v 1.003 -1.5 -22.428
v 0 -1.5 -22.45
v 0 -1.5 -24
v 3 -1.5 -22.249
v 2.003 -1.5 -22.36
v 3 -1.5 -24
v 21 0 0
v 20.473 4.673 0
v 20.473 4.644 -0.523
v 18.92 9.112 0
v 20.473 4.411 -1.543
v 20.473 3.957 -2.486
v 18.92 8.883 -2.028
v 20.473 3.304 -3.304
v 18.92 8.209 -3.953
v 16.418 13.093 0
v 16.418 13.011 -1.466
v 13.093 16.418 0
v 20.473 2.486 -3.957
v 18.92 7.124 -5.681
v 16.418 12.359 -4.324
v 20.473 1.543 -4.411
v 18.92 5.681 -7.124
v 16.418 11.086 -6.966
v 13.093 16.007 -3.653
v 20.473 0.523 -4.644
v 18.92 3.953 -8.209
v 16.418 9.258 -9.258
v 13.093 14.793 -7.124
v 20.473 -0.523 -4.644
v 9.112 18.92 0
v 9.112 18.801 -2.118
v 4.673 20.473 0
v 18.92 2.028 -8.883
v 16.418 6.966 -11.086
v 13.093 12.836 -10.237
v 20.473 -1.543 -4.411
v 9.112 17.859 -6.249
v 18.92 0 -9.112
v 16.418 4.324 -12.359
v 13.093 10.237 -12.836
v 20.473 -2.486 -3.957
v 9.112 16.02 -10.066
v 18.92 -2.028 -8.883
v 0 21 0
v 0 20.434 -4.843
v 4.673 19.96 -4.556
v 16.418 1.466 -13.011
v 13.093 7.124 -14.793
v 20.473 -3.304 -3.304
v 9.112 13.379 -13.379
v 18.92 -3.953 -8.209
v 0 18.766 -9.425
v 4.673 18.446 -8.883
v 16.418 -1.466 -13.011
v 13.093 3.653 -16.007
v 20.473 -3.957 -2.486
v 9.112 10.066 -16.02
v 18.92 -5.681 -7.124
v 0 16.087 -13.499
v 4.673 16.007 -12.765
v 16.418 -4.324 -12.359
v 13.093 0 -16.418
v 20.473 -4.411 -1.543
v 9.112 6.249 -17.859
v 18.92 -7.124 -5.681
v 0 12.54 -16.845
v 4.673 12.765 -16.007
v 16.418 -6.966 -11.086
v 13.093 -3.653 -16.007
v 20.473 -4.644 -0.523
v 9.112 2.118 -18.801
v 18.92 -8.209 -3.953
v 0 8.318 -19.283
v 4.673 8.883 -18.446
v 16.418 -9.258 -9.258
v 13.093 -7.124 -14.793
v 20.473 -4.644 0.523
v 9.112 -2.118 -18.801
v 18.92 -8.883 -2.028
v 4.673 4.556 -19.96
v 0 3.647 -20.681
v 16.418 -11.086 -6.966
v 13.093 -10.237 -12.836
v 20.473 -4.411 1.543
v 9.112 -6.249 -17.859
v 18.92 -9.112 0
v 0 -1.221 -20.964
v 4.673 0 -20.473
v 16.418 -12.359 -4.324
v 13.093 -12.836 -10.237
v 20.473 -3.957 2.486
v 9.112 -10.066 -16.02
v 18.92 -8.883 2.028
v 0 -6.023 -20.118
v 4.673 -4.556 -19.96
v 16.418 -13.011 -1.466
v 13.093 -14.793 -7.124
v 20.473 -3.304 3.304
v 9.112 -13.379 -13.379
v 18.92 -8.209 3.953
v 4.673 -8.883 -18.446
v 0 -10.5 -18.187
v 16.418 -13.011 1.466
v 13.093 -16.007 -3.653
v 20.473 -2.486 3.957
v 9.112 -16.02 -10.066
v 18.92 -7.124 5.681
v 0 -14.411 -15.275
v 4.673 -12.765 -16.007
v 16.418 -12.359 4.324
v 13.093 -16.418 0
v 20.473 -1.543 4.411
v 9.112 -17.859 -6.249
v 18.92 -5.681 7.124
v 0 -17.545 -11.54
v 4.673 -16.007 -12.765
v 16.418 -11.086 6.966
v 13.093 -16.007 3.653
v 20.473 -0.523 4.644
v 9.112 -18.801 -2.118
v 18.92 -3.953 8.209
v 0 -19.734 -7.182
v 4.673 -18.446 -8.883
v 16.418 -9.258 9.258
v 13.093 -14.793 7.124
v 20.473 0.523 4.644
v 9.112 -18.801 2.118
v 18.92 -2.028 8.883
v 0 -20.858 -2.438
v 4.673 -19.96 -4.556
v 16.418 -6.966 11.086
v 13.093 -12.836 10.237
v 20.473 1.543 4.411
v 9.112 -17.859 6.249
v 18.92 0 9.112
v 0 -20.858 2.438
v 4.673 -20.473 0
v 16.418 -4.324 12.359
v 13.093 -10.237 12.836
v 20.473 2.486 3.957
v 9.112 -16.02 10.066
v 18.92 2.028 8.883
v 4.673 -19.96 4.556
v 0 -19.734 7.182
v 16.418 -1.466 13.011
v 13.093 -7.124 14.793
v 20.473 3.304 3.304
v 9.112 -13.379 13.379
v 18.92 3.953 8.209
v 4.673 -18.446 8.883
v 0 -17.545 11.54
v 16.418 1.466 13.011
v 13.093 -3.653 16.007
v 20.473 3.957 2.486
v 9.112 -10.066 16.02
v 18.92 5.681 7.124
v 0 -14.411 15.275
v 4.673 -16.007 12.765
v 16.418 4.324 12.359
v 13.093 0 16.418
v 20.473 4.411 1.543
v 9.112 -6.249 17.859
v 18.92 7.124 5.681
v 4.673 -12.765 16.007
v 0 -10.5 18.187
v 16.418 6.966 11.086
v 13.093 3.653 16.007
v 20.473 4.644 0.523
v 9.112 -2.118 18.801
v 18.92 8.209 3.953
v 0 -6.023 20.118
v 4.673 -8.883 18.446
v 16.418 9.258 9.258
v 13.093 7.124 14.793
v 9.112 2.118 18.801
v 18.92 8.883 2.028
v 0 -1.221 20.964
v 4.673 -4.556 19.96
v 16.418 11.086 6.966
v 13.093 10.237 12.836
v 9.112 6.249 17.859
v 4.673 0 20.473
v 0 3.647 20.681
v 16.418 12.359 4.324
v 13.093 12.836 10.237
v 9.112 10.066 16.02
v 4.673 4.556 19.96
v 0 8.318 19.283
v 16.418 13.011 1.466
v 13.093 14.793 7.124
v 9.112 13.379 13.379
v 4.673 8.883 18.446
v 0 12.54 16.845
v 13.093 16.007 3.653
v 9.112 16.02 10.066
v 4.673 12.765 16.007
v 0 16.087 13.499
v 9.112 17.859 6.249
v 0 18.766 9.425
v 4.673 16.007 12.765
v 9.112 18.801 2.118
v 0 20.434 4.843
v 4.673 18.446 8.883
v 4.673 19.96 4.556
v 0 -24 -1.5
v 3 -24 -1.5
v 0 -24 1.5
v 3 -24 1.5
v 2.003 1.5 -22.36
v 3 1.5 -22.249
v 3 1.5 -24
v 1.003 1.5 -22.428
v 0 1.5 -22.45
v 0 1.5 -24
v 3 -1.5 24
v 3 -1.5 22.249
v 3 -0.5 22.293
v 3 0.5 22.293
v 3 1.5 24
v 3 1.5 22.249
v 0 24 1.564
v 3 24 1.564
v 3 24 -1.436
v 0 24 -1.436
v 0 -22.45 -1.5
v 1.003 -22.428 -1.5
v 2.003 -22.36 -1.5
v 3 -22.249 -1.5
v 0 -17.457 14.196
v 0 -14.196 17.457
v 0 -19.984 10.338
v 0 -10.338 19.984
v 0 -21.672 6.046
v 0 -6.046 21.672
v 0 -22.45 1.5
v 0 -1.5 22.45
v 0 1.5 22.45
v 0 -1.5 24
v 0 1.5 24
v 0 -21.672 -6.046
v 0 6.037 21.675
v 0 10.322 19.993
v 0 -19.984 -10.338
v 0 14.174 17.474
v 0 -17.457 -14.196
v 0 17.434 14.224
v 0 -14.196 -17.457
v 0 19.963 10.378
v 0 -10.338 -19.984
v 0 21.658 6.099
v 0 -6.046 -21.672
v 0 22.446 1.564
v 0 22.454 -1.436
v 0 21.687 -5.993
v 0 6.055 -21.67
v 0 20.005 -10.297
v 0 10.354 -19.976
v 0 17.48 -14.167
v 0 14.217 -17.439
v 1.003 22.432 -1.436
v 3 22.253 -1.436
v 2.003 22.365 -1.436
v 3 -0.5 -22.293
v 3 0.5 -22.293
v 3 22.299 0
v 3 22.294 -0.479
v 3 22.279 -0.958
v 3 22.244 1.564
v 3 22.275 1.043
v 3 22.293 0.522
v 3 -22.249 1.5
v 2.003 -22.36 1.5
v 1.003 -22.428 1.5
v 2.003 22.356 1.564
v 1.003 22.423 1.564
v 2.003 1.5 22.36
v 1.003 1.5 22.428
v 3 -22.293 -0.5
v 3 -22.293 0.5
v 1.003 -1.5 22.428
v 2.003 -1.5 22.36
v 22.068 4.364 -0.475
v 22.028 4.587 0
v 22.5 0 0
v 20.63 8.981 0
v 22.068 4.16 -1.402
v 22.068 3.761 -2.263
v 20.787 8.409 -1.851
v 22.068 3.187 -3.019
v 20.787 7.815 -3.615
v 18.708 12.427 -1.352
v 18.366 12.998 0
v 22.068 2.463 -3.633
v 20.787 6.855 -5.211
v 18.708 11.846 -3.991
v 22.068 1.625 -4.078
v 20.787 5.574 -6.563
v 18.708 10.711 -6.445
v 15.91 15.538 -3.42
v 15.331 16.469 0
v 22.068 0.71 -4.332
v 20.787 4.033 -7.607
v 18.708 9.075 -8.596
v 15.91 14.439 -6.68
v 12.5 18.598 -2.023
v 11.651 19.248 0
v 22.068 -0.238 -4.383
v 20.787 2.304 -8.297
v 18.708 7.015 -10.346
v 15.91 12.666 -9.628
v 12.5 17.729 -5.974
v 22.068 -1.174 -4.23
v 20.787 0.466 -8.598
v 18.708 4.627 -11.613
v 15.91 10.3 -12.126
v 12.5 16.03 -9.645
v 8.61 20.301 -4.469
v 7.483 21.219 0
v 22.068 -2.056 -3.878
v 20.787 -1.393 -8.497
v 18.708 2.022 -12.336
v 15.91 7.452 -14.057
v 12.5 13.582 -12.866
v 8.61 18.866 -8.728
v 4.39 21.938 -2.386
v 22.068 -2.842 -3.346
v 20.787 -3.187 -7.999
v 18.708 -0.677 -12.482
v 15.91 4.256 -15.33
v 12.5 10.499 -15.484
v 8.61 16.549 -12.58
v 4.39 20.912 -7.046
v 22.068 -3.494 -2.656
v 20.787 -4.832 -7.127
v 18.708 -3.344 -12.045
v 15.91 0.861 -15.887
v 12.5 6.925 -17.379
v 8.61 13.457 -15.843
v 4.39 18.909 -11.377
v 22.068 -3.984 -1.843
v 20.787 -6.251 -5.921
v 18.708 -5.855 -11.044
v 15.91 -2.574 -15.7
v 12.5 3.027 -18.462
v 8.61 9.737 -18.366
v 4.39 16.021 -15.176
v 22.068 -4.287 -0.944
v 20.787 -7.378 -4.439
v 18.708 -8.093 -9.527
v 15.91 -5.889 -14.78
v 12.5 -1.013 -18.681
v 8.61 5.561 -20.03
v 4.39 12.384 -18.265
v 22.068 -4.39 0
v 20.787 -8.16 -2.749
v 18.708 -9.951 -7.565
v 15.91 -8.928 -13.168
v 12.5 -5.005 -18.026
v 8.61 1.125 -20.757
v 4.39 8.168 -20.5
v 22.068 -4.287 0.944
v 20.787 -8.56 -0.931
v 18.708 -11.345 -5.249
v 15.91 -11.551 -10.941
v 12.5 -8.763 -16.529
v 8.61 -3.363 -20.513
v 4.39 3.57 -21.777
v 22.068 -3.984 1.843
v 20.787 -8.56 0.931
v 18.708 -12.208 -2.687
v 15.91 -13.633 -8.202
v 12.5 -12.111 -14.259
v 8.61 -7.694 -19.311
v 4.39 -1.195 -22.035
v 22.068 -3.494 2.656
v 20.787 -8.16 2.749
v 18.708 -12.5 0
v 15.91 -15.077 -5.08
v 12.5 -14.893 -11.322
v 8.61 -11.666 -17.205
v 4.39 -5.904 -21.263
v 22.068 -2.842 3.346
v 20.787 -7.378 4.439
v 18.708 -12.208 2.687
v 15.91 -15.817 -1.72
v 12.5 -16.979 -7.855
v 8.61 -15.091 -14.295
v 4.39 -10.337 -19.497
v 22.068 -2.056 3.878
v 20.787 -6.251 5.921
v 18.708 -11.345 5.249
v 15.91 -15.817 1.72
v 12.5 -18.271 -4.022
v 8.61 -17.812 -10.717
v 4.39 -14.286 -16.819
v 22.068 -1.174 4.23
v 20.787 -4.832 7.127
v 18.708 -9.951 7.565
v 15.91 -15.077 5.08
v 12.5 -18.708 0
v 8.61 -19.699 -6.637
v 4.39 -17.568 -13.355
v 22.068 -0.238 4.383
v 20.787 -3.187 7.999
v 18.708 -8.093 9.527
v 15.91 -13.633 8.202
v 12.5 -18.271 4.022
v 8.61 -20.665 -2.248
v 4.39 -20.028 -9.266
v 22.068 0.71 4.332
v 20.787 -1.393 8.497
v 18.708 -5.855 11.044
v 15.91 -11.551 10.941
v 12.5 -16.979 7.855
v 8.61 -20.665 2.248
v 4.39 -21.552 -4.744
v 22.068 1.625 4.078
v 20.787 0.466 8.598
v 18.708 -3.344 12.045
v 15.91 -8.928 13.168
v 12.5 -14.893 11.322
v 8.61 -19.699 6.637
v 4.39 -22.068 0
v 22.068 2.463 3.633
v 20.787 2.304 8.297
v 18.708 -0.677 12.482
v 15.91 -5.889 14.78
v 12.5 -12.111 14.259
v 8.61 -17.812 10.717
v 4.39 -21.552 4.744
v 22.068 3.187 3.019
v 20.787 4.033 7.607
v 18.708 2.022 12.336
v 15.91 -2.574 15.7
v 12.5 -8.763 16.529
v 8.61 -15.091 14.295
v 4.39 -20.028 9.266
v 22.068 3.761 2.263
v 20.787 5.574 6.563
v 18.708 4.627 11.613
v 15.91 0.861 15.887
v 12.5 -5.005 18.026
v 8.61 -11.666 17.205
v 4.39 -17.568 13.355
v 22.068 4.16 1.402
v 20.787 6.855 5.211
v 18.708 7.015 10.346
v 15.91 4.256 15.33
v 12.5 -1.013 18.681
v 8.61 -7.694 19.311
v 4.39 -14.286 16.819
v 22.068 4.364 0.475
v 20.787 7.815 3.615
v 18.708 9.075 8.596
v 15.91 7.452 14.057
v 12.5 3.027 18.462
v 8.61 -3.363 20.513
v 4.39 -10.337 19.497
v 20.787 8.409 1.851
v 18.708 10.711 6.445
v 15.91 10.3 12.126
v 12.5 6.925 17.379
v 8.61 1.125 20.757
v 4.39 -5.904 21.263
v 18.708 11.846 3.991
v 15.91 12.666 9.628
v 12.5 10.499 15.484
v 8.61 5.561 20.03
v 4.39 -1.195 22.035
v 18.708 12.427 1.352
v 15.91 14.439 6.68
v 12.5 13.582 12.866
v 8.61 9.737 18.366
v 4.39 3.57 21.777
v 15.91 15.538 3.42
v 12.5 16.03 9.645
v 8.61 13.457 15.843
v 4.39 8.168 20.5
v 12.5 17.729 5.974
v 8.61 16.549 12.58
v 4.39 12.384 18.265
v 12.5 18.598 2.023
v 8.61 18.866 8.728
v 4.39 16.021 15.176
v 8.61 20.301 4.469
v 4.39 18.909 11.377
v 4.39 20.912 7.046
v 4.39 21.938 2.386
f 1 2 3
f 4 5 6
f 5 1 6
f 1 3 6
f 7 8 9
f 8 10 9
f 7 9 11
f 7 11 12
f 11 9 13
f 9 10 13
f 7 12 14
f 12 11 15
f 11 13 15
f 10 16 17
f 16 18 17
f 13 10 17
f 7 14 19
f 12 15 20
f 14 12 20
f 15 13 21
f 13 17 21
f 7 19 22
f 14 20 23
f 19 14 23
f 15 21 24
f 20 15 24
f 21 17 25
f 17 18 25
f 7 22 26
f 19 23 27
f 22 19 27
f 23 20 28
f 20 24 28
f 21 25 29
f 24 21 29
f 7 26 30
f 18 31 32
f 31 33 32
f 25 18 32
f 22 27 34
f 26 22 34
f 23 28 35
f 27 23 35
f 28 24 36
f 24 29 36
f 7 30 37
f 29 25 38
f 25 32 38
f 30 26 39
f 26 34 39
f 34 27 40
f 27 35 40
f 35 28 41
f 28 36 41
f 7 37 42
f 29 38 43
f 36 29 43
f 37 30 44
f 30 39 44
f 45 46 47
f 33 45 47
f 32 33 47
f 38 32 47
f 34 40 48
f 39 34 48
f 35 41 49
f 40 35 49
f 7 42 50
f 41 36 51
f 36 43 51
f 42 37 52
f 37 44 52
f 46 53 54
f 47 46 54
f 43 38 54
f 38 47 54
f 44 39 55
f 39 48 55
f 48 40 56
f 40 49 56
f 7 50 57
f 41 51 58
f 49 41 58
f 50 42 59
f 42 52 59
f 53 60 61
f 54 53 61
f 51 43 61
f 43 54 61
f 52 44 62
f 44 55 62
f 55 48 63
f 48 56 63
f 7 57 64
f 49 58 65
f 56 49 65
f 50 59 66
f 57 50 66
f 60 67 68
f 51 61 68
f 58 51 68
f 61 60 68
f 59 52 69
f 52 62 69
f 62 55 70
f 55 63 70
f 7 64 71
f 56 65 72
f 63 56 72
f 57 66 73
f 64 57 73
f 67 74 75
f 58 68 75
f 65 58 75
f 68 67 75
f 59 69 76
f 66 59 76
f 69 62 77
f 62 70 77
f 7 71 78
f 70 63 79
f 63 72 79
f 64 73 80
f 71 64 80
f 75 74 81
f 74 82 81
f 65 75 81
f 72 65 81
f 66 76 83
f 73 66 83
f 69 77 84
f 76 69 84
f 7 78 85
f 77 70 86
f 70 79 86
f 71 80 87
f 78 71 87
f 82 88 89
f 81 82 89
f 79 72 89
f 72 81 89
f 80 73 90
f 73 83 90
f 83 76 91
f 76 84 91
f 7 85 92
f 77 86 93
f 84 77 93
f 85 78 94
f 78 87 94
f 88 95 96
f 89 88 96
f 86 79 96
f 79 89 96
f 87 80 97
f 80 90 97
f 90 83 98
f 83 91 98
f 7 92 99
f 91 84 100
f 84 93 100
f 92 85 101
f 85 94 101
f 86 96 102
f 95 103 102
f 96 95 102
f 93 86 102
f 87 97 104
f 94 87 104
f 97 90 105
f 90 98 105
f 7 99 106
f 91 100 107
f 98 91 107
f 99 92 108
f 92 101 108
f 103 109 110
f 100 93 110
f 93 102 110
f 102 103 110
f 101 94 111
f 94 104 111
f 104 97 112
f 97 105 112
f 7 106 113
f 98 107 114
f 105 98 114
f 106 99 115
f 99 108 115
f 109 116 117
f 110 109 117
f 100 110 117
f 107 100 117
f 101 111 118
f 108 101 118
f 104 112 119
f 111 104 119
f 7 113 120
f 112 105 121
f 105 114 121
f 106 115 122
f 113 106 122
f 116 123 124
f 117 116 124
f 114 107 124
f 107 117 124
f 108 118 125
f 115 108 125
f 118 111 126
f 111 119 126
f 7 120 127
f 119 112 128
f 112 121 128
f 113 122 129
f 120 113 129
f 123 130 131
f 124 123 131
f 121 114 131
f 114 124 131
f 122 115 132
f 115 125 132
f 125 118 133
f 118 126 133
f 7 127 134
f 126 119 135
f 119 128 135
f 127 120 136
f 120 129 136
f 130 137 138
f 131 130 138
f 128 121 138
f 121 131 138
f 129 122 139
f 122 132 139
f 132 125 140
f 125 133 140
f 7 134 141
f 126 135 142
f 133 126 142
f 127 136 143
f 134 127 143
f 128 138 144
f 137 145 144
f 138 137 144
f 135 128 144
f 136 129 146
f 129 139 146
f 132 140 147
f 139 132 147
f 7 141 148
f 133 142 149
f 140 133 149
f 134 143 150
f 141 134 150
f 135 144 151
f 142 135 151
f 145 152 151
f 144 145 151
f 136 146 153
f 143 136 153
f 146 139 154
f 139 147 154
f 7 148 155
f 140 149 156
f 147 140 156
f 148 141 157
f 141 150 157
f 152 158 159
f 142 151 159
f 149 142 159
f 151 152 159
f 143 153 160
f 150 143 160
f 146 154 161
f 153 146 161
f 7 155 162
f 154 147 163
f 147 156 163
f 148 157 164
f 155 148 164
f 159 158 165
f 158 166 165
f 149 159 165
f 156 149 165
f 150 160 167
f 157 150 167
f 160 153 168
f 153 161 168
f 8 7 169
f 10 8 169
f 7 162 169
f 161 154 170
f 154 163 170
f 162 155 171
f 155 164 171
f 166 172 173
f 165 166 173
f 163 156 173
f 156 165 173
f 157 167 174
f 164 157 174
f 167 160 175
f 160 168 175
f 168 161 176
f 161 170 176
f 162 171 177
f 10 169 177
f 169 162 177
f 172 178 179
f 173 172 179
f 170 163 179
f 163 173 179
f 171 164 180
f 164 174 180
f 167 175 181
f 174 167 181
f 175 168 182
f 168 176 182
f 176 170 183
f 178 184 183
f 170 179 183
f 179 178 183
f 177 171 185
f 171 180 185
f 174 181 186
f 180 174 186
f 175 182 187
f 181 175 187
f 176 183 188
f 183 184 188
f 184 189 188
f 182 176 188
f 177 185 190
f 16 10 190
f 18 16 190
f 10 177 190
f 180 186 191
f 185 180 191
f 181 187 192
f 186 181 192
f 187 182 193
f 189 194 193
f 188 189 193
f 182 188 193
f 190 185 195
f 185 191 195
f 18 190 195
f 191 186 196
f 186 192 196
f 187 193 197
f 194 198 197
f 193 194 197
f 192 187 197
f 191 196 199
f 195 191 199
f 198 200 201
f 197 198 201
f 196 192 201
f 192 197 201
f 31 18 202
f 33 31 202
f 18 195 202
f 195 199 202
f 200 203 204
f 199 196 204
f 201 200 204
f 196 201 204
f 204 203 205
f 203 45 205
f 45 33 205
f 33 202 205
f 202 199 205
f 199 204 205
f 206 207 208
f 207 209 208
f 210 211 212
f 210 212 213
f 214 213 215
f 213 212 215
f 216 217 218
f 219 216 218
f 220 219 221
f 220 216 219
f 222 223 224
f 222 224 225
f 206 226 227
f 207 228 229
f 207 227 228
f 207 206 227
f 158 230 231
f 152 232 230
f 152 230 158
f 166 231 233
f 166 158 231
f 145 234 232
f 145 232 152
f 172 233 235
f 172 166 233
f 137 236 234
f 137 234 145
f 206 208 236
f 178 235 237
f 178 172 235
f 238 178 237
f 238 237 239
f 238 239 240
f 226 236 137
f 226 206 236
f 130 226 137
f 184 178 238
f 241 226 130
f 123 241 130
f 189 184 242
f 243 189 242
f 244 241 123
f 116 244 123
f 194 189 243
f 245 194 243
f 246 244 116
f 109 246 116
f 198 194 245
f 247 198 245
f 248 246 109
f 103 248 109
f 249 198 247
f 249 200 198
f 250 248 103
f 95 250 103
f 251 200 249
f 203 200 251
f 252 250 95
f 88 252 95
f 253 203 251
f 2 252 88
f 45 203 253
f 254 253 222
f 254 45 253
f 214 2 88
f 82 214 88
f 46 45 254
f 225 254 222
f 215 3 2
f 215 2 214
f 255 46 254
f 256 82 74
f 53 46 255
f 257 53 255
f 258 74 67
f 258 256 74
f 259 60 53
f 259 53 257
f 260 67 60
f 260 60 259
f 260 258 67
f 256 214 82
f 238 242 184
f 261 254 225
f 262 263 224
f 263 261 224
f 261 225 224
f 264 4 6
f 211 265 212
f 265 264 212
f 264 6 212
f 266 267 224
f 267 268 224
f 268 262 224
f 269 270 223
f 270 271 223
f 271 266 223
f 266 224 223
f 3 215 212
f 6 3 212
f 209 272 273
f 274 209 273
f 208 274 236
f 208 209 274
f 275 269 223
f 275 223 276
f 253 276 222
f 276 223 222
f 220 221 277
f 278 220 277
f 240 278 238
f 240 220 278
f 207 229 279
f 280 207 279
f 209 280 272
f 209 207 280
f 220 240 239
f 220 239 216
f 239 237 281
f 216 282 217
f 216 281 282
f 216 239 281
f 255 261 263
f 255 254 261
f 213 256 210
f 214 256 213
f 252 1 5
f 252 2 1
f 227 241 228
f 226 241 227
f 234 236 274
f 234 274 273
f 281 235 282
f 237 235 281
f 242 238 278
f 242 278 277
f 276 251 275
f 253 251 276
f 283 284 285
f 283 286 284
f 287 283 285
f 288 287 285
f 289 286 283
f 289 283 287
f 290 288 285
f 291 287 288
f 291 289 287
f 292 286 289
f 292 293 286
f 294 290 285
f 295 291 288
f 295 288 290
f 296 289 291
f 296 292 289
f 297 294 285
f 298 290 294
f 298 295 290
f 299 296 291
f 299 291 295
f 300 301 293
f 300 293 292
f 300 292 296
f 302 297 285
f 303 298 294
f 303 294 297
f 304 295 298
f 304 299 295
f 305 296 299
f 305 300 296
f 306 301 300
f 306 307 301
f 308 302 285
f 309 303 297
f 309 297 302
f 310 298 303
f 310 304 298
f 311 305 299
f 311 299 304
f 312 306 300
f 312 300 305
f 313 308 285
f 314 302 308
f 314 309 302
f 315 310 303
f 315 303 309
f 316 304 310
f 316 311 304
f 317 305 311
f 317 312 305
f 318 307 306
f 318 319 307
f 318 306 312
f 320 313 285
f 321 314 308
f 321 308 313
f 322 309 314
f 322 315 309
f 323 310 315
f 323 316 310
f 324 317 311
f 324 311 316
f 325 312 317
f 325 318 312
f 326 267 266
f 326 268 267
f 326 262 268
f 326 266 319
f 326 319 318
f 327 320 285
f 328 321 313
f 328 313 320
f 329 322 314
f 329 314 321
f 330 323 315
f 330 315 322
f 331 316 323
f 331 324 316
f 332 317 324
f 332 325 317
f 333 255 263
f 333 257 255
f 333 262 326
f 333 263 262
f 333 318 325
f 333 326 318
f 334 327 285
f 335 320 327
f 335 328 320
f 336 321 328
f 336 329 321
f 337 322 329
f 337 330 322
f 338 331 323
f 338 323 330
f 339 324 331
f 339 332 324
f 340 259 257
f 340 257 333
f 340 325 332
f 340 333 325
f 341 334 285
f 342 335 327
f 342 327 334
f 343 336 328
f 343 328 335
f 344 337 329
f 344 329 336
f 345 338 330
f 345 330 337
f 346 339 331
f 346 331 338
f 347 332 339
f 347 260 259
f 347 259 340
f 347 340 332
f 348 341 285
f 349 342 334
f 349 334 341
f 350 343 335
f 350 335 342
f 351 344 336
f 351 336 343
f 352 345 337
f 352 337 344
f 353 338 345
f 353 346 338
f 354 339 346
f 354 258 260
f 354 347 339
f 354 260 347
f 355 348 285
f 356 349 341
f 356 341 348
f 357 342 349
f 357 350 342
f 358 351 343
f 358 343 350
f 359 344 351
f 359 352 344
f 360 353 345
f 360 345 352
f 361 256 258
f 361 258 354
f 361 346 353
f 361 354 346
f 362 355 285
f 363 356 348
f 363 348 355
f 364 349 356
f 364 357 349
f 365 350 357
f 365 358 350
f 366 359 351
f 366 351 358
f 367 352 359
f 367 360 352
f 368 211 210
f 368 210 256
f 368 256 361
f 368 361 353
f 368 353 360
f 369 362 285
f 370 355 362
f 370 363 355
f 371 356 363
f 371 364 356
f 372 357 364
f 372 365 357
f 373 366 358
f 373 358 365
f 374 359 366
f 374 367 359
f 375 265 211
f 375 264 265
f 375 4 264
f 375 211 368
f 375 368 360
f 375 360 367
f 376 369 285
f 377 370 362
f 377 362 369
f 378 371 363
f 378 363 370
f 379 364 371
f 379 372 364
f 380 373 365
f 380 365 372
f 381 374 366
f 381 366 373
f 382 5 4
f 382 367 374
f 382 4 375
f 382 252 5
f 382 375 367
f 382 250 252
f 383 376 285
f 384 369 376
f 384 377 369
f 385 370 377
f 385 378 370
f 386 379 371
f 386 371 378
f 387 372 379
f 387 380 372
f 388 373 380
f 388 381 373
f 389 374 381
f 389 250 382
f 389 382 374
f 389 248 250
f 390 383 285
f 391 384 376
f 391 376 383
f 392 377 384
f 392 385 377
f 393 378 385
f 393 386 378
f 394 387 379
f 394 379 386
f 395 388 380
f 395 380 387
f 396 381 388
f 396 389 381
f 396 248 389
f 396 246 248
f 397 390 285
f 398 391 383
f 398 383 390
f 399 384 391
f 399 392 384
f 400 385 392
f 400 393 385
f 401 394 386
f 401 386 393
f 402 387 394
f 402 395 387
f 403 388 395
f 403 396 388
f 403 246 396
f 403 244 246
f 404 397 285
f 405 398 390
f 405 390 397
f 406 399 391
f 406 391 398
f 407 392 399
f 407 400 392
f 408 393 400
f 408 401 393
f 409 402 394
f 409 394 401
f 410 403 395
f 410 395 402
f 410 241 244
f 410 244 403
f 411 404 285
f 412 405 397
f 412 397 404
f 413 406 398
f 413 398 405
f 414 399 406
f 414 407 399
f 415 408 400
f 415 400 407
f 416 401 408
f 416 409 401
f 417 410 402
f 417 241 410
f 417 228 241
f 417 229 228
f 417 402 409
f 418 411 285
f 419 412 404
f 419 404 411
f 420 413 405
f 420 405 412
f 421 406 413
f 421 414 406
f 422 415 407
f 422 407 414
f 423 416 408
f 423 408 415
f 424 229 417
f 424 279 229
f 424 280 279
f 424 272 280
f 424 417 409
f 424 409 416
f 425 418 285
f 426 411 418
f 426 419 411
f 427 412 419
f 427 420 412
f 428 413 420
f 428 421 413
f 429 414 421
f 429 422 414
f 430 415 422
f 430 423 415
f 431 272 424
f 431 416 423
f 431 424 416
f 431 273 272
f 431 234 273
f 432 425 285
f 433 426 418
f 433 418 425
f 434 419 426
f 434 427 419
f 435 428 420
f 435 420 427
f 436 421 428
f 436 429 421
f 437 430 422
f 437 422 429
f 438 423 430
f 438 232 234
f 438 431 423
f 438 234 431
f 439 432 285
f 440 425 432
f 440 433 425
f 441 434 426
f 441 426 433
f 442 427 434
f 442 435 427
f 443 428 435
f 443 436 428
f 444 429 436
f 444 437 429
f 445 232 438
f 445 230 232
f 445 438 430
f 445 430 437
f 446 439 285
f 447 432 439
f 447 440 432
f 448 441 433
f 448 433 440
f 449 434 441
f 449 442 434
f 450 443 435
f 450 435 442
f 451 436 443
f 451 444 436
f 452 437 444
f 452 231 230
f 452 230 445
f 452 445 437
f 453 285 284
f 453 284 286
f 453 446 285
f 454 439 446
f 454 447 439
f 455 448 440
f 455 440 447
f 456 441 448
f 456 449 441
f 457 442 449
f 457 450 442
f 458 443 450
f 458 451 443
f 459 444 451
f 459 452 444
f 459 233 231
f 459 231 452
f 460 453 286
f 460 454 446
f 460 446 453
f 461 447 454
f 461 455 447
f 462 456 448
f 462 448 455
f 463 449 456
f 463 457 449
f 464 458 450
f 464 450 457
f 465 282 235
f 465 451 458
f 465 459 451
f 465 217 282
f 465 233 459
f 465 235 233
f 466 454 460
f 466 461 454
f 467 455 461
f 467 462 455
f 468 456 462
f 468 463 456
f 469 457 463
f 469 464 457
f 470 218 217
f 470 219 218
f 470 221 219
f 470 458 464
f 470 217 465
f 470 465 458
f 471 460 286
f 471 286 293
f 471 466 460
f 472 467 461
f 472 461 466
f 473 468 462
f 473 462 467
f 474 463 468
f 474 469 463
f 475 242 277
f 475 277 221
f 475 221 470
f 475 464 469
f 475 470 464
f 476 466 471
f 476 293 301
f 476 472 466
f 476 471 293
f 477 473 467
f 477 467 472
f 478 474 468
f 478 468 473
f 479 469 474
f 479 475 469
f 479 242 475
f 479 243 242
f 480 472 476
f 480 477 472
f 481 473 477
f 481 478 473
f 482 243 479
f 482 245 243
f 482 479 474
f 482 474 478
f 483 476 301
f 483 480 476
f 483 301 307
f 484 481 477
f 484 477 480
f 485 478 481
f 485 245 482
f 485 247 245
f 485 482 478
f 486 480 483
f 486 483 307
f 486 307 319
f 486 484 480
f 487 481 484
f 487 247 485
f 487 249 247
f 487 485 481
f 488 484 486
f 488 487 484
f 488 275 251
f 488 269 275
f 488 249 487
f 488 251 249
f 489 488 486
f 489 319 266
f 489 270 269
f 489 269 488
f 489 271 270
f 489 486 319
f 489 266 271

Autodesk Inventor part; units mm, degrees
sketch "Sketch1" plane through (0, 0, 0) normal (0, 0, 1) x (1, 0, 0)
  line L0 (0, 0) -> (0, 22.5)
  line L1 (0, 22.5) -> (0, 0)
  line L2 (22.5, 0) -> (0, 0)
  arc A0 (22.5, 0) -> (0, 22.5) centre (0, 0) ccw
  dimension "d3" = 22.5
  dimension "d4" = 22.5
revolve "Revolution2" add sketch "Sketch1" angle 360 about axis through (22.5, 0, 0) along (-1, 0, 0)
shell "Shell1" thickness 1.5 removed faces 1 at (0, 7.2821, 1.7949)
ref_plane "Work Plane1" through (0, -24, 0) normal (0, 1, 0) x (-1, 0, 0)
ref_plane "Work Plane2" through (0, 24, 0) normal (0, 1, 0) x (-1, 0, 0)
ref_plane "Work Plane3" through (0, 0, 24) normal (0, 0, 1) x (1, 0, 0)
ref_plane "Work Plane4" through (0, 0, -24) normal (0, 0, 1) x (1, 0, 0)
sketch "Sketch2" plane through (0, 0, 24) normal (0, 0, 1) x (1, 0, 0)
  line L0 (0, -22.5) -> (0, 22.5) projected
  line L1 (0, -1.5) -> (3, -1.5)
  line L2 (3, -1.5) -> (3, 1.5)
  line L3 (3, 1.5) -> (0, 1.5)
  line L4 (0, 1.5) -> (0, -1.5)
  point P0 (0, 0)
  dimension "d24" = 3
  dimension "d25" = 3
sketch "Sketch3" plane through (0, -24, 0) normal (0, 1, 0) x (-1, 0, 0)
  line L0 (0, 22.5) -> (0, -22.5) projected
  line L1 (0, -1.5) -> (-3, -1.5)
  line L2 (-3, -1.5) -> (-3, 1.5)
  line L3 (-3, 1.5) -> (0, 1.5)
  line L4 (0, 1.5) -> (0, -1.5)
  point P0 (0, 0)
  dimension "d26" = 3
  dimension "d27" = 3
sketch "Sketch4" plane through (0, 0, -24) normal (0, 0, 1) x (1, 0, 0)
  line L0 (0, -22.5) -> (0, 22.5) projected
  line L1 (0, -1.5) -> (3, -1.5)
  line L2 (3, -1.5) -> (3, 1.5)
  line L3 (3, 1.5) -> (0, 1.5)
  line L4 (0, 1.5) -> (0, -1.5)
  point P0 (0, 0)
  dimension "d28" = 3
  dimension "d29" = 3
sketch "Sketch5" plane through (0, 24, 0) normal (0, 1, 0) x (-1, 0, 0)
  line L0 (0, -1.4364) -> (-3, -1.4364)
  line L1 (-3, -1.4364) -> (-3, 1.5636)
  line L2 (-3, 1.5636) -> (0, 1.5636)
  line L3 (0, 1.5636) -> (0, -1.4364)
  point P0 (0, 0)
  dimension "d30" = 3
  dimension "d31" = 3
extrude "Extrusion5" add sketch "Sketch2" against normal up to next
extrude "Extrusion6" add sketch "Sketch3" along normal up to next
extrude "Extrusion7" add sketch "Sketch4" along normal up to next
extrude "Extrusion8" add sketch "Sketch5" against normal up to next
properties part number "Liner 2" material "Polyethylene, High Density"
